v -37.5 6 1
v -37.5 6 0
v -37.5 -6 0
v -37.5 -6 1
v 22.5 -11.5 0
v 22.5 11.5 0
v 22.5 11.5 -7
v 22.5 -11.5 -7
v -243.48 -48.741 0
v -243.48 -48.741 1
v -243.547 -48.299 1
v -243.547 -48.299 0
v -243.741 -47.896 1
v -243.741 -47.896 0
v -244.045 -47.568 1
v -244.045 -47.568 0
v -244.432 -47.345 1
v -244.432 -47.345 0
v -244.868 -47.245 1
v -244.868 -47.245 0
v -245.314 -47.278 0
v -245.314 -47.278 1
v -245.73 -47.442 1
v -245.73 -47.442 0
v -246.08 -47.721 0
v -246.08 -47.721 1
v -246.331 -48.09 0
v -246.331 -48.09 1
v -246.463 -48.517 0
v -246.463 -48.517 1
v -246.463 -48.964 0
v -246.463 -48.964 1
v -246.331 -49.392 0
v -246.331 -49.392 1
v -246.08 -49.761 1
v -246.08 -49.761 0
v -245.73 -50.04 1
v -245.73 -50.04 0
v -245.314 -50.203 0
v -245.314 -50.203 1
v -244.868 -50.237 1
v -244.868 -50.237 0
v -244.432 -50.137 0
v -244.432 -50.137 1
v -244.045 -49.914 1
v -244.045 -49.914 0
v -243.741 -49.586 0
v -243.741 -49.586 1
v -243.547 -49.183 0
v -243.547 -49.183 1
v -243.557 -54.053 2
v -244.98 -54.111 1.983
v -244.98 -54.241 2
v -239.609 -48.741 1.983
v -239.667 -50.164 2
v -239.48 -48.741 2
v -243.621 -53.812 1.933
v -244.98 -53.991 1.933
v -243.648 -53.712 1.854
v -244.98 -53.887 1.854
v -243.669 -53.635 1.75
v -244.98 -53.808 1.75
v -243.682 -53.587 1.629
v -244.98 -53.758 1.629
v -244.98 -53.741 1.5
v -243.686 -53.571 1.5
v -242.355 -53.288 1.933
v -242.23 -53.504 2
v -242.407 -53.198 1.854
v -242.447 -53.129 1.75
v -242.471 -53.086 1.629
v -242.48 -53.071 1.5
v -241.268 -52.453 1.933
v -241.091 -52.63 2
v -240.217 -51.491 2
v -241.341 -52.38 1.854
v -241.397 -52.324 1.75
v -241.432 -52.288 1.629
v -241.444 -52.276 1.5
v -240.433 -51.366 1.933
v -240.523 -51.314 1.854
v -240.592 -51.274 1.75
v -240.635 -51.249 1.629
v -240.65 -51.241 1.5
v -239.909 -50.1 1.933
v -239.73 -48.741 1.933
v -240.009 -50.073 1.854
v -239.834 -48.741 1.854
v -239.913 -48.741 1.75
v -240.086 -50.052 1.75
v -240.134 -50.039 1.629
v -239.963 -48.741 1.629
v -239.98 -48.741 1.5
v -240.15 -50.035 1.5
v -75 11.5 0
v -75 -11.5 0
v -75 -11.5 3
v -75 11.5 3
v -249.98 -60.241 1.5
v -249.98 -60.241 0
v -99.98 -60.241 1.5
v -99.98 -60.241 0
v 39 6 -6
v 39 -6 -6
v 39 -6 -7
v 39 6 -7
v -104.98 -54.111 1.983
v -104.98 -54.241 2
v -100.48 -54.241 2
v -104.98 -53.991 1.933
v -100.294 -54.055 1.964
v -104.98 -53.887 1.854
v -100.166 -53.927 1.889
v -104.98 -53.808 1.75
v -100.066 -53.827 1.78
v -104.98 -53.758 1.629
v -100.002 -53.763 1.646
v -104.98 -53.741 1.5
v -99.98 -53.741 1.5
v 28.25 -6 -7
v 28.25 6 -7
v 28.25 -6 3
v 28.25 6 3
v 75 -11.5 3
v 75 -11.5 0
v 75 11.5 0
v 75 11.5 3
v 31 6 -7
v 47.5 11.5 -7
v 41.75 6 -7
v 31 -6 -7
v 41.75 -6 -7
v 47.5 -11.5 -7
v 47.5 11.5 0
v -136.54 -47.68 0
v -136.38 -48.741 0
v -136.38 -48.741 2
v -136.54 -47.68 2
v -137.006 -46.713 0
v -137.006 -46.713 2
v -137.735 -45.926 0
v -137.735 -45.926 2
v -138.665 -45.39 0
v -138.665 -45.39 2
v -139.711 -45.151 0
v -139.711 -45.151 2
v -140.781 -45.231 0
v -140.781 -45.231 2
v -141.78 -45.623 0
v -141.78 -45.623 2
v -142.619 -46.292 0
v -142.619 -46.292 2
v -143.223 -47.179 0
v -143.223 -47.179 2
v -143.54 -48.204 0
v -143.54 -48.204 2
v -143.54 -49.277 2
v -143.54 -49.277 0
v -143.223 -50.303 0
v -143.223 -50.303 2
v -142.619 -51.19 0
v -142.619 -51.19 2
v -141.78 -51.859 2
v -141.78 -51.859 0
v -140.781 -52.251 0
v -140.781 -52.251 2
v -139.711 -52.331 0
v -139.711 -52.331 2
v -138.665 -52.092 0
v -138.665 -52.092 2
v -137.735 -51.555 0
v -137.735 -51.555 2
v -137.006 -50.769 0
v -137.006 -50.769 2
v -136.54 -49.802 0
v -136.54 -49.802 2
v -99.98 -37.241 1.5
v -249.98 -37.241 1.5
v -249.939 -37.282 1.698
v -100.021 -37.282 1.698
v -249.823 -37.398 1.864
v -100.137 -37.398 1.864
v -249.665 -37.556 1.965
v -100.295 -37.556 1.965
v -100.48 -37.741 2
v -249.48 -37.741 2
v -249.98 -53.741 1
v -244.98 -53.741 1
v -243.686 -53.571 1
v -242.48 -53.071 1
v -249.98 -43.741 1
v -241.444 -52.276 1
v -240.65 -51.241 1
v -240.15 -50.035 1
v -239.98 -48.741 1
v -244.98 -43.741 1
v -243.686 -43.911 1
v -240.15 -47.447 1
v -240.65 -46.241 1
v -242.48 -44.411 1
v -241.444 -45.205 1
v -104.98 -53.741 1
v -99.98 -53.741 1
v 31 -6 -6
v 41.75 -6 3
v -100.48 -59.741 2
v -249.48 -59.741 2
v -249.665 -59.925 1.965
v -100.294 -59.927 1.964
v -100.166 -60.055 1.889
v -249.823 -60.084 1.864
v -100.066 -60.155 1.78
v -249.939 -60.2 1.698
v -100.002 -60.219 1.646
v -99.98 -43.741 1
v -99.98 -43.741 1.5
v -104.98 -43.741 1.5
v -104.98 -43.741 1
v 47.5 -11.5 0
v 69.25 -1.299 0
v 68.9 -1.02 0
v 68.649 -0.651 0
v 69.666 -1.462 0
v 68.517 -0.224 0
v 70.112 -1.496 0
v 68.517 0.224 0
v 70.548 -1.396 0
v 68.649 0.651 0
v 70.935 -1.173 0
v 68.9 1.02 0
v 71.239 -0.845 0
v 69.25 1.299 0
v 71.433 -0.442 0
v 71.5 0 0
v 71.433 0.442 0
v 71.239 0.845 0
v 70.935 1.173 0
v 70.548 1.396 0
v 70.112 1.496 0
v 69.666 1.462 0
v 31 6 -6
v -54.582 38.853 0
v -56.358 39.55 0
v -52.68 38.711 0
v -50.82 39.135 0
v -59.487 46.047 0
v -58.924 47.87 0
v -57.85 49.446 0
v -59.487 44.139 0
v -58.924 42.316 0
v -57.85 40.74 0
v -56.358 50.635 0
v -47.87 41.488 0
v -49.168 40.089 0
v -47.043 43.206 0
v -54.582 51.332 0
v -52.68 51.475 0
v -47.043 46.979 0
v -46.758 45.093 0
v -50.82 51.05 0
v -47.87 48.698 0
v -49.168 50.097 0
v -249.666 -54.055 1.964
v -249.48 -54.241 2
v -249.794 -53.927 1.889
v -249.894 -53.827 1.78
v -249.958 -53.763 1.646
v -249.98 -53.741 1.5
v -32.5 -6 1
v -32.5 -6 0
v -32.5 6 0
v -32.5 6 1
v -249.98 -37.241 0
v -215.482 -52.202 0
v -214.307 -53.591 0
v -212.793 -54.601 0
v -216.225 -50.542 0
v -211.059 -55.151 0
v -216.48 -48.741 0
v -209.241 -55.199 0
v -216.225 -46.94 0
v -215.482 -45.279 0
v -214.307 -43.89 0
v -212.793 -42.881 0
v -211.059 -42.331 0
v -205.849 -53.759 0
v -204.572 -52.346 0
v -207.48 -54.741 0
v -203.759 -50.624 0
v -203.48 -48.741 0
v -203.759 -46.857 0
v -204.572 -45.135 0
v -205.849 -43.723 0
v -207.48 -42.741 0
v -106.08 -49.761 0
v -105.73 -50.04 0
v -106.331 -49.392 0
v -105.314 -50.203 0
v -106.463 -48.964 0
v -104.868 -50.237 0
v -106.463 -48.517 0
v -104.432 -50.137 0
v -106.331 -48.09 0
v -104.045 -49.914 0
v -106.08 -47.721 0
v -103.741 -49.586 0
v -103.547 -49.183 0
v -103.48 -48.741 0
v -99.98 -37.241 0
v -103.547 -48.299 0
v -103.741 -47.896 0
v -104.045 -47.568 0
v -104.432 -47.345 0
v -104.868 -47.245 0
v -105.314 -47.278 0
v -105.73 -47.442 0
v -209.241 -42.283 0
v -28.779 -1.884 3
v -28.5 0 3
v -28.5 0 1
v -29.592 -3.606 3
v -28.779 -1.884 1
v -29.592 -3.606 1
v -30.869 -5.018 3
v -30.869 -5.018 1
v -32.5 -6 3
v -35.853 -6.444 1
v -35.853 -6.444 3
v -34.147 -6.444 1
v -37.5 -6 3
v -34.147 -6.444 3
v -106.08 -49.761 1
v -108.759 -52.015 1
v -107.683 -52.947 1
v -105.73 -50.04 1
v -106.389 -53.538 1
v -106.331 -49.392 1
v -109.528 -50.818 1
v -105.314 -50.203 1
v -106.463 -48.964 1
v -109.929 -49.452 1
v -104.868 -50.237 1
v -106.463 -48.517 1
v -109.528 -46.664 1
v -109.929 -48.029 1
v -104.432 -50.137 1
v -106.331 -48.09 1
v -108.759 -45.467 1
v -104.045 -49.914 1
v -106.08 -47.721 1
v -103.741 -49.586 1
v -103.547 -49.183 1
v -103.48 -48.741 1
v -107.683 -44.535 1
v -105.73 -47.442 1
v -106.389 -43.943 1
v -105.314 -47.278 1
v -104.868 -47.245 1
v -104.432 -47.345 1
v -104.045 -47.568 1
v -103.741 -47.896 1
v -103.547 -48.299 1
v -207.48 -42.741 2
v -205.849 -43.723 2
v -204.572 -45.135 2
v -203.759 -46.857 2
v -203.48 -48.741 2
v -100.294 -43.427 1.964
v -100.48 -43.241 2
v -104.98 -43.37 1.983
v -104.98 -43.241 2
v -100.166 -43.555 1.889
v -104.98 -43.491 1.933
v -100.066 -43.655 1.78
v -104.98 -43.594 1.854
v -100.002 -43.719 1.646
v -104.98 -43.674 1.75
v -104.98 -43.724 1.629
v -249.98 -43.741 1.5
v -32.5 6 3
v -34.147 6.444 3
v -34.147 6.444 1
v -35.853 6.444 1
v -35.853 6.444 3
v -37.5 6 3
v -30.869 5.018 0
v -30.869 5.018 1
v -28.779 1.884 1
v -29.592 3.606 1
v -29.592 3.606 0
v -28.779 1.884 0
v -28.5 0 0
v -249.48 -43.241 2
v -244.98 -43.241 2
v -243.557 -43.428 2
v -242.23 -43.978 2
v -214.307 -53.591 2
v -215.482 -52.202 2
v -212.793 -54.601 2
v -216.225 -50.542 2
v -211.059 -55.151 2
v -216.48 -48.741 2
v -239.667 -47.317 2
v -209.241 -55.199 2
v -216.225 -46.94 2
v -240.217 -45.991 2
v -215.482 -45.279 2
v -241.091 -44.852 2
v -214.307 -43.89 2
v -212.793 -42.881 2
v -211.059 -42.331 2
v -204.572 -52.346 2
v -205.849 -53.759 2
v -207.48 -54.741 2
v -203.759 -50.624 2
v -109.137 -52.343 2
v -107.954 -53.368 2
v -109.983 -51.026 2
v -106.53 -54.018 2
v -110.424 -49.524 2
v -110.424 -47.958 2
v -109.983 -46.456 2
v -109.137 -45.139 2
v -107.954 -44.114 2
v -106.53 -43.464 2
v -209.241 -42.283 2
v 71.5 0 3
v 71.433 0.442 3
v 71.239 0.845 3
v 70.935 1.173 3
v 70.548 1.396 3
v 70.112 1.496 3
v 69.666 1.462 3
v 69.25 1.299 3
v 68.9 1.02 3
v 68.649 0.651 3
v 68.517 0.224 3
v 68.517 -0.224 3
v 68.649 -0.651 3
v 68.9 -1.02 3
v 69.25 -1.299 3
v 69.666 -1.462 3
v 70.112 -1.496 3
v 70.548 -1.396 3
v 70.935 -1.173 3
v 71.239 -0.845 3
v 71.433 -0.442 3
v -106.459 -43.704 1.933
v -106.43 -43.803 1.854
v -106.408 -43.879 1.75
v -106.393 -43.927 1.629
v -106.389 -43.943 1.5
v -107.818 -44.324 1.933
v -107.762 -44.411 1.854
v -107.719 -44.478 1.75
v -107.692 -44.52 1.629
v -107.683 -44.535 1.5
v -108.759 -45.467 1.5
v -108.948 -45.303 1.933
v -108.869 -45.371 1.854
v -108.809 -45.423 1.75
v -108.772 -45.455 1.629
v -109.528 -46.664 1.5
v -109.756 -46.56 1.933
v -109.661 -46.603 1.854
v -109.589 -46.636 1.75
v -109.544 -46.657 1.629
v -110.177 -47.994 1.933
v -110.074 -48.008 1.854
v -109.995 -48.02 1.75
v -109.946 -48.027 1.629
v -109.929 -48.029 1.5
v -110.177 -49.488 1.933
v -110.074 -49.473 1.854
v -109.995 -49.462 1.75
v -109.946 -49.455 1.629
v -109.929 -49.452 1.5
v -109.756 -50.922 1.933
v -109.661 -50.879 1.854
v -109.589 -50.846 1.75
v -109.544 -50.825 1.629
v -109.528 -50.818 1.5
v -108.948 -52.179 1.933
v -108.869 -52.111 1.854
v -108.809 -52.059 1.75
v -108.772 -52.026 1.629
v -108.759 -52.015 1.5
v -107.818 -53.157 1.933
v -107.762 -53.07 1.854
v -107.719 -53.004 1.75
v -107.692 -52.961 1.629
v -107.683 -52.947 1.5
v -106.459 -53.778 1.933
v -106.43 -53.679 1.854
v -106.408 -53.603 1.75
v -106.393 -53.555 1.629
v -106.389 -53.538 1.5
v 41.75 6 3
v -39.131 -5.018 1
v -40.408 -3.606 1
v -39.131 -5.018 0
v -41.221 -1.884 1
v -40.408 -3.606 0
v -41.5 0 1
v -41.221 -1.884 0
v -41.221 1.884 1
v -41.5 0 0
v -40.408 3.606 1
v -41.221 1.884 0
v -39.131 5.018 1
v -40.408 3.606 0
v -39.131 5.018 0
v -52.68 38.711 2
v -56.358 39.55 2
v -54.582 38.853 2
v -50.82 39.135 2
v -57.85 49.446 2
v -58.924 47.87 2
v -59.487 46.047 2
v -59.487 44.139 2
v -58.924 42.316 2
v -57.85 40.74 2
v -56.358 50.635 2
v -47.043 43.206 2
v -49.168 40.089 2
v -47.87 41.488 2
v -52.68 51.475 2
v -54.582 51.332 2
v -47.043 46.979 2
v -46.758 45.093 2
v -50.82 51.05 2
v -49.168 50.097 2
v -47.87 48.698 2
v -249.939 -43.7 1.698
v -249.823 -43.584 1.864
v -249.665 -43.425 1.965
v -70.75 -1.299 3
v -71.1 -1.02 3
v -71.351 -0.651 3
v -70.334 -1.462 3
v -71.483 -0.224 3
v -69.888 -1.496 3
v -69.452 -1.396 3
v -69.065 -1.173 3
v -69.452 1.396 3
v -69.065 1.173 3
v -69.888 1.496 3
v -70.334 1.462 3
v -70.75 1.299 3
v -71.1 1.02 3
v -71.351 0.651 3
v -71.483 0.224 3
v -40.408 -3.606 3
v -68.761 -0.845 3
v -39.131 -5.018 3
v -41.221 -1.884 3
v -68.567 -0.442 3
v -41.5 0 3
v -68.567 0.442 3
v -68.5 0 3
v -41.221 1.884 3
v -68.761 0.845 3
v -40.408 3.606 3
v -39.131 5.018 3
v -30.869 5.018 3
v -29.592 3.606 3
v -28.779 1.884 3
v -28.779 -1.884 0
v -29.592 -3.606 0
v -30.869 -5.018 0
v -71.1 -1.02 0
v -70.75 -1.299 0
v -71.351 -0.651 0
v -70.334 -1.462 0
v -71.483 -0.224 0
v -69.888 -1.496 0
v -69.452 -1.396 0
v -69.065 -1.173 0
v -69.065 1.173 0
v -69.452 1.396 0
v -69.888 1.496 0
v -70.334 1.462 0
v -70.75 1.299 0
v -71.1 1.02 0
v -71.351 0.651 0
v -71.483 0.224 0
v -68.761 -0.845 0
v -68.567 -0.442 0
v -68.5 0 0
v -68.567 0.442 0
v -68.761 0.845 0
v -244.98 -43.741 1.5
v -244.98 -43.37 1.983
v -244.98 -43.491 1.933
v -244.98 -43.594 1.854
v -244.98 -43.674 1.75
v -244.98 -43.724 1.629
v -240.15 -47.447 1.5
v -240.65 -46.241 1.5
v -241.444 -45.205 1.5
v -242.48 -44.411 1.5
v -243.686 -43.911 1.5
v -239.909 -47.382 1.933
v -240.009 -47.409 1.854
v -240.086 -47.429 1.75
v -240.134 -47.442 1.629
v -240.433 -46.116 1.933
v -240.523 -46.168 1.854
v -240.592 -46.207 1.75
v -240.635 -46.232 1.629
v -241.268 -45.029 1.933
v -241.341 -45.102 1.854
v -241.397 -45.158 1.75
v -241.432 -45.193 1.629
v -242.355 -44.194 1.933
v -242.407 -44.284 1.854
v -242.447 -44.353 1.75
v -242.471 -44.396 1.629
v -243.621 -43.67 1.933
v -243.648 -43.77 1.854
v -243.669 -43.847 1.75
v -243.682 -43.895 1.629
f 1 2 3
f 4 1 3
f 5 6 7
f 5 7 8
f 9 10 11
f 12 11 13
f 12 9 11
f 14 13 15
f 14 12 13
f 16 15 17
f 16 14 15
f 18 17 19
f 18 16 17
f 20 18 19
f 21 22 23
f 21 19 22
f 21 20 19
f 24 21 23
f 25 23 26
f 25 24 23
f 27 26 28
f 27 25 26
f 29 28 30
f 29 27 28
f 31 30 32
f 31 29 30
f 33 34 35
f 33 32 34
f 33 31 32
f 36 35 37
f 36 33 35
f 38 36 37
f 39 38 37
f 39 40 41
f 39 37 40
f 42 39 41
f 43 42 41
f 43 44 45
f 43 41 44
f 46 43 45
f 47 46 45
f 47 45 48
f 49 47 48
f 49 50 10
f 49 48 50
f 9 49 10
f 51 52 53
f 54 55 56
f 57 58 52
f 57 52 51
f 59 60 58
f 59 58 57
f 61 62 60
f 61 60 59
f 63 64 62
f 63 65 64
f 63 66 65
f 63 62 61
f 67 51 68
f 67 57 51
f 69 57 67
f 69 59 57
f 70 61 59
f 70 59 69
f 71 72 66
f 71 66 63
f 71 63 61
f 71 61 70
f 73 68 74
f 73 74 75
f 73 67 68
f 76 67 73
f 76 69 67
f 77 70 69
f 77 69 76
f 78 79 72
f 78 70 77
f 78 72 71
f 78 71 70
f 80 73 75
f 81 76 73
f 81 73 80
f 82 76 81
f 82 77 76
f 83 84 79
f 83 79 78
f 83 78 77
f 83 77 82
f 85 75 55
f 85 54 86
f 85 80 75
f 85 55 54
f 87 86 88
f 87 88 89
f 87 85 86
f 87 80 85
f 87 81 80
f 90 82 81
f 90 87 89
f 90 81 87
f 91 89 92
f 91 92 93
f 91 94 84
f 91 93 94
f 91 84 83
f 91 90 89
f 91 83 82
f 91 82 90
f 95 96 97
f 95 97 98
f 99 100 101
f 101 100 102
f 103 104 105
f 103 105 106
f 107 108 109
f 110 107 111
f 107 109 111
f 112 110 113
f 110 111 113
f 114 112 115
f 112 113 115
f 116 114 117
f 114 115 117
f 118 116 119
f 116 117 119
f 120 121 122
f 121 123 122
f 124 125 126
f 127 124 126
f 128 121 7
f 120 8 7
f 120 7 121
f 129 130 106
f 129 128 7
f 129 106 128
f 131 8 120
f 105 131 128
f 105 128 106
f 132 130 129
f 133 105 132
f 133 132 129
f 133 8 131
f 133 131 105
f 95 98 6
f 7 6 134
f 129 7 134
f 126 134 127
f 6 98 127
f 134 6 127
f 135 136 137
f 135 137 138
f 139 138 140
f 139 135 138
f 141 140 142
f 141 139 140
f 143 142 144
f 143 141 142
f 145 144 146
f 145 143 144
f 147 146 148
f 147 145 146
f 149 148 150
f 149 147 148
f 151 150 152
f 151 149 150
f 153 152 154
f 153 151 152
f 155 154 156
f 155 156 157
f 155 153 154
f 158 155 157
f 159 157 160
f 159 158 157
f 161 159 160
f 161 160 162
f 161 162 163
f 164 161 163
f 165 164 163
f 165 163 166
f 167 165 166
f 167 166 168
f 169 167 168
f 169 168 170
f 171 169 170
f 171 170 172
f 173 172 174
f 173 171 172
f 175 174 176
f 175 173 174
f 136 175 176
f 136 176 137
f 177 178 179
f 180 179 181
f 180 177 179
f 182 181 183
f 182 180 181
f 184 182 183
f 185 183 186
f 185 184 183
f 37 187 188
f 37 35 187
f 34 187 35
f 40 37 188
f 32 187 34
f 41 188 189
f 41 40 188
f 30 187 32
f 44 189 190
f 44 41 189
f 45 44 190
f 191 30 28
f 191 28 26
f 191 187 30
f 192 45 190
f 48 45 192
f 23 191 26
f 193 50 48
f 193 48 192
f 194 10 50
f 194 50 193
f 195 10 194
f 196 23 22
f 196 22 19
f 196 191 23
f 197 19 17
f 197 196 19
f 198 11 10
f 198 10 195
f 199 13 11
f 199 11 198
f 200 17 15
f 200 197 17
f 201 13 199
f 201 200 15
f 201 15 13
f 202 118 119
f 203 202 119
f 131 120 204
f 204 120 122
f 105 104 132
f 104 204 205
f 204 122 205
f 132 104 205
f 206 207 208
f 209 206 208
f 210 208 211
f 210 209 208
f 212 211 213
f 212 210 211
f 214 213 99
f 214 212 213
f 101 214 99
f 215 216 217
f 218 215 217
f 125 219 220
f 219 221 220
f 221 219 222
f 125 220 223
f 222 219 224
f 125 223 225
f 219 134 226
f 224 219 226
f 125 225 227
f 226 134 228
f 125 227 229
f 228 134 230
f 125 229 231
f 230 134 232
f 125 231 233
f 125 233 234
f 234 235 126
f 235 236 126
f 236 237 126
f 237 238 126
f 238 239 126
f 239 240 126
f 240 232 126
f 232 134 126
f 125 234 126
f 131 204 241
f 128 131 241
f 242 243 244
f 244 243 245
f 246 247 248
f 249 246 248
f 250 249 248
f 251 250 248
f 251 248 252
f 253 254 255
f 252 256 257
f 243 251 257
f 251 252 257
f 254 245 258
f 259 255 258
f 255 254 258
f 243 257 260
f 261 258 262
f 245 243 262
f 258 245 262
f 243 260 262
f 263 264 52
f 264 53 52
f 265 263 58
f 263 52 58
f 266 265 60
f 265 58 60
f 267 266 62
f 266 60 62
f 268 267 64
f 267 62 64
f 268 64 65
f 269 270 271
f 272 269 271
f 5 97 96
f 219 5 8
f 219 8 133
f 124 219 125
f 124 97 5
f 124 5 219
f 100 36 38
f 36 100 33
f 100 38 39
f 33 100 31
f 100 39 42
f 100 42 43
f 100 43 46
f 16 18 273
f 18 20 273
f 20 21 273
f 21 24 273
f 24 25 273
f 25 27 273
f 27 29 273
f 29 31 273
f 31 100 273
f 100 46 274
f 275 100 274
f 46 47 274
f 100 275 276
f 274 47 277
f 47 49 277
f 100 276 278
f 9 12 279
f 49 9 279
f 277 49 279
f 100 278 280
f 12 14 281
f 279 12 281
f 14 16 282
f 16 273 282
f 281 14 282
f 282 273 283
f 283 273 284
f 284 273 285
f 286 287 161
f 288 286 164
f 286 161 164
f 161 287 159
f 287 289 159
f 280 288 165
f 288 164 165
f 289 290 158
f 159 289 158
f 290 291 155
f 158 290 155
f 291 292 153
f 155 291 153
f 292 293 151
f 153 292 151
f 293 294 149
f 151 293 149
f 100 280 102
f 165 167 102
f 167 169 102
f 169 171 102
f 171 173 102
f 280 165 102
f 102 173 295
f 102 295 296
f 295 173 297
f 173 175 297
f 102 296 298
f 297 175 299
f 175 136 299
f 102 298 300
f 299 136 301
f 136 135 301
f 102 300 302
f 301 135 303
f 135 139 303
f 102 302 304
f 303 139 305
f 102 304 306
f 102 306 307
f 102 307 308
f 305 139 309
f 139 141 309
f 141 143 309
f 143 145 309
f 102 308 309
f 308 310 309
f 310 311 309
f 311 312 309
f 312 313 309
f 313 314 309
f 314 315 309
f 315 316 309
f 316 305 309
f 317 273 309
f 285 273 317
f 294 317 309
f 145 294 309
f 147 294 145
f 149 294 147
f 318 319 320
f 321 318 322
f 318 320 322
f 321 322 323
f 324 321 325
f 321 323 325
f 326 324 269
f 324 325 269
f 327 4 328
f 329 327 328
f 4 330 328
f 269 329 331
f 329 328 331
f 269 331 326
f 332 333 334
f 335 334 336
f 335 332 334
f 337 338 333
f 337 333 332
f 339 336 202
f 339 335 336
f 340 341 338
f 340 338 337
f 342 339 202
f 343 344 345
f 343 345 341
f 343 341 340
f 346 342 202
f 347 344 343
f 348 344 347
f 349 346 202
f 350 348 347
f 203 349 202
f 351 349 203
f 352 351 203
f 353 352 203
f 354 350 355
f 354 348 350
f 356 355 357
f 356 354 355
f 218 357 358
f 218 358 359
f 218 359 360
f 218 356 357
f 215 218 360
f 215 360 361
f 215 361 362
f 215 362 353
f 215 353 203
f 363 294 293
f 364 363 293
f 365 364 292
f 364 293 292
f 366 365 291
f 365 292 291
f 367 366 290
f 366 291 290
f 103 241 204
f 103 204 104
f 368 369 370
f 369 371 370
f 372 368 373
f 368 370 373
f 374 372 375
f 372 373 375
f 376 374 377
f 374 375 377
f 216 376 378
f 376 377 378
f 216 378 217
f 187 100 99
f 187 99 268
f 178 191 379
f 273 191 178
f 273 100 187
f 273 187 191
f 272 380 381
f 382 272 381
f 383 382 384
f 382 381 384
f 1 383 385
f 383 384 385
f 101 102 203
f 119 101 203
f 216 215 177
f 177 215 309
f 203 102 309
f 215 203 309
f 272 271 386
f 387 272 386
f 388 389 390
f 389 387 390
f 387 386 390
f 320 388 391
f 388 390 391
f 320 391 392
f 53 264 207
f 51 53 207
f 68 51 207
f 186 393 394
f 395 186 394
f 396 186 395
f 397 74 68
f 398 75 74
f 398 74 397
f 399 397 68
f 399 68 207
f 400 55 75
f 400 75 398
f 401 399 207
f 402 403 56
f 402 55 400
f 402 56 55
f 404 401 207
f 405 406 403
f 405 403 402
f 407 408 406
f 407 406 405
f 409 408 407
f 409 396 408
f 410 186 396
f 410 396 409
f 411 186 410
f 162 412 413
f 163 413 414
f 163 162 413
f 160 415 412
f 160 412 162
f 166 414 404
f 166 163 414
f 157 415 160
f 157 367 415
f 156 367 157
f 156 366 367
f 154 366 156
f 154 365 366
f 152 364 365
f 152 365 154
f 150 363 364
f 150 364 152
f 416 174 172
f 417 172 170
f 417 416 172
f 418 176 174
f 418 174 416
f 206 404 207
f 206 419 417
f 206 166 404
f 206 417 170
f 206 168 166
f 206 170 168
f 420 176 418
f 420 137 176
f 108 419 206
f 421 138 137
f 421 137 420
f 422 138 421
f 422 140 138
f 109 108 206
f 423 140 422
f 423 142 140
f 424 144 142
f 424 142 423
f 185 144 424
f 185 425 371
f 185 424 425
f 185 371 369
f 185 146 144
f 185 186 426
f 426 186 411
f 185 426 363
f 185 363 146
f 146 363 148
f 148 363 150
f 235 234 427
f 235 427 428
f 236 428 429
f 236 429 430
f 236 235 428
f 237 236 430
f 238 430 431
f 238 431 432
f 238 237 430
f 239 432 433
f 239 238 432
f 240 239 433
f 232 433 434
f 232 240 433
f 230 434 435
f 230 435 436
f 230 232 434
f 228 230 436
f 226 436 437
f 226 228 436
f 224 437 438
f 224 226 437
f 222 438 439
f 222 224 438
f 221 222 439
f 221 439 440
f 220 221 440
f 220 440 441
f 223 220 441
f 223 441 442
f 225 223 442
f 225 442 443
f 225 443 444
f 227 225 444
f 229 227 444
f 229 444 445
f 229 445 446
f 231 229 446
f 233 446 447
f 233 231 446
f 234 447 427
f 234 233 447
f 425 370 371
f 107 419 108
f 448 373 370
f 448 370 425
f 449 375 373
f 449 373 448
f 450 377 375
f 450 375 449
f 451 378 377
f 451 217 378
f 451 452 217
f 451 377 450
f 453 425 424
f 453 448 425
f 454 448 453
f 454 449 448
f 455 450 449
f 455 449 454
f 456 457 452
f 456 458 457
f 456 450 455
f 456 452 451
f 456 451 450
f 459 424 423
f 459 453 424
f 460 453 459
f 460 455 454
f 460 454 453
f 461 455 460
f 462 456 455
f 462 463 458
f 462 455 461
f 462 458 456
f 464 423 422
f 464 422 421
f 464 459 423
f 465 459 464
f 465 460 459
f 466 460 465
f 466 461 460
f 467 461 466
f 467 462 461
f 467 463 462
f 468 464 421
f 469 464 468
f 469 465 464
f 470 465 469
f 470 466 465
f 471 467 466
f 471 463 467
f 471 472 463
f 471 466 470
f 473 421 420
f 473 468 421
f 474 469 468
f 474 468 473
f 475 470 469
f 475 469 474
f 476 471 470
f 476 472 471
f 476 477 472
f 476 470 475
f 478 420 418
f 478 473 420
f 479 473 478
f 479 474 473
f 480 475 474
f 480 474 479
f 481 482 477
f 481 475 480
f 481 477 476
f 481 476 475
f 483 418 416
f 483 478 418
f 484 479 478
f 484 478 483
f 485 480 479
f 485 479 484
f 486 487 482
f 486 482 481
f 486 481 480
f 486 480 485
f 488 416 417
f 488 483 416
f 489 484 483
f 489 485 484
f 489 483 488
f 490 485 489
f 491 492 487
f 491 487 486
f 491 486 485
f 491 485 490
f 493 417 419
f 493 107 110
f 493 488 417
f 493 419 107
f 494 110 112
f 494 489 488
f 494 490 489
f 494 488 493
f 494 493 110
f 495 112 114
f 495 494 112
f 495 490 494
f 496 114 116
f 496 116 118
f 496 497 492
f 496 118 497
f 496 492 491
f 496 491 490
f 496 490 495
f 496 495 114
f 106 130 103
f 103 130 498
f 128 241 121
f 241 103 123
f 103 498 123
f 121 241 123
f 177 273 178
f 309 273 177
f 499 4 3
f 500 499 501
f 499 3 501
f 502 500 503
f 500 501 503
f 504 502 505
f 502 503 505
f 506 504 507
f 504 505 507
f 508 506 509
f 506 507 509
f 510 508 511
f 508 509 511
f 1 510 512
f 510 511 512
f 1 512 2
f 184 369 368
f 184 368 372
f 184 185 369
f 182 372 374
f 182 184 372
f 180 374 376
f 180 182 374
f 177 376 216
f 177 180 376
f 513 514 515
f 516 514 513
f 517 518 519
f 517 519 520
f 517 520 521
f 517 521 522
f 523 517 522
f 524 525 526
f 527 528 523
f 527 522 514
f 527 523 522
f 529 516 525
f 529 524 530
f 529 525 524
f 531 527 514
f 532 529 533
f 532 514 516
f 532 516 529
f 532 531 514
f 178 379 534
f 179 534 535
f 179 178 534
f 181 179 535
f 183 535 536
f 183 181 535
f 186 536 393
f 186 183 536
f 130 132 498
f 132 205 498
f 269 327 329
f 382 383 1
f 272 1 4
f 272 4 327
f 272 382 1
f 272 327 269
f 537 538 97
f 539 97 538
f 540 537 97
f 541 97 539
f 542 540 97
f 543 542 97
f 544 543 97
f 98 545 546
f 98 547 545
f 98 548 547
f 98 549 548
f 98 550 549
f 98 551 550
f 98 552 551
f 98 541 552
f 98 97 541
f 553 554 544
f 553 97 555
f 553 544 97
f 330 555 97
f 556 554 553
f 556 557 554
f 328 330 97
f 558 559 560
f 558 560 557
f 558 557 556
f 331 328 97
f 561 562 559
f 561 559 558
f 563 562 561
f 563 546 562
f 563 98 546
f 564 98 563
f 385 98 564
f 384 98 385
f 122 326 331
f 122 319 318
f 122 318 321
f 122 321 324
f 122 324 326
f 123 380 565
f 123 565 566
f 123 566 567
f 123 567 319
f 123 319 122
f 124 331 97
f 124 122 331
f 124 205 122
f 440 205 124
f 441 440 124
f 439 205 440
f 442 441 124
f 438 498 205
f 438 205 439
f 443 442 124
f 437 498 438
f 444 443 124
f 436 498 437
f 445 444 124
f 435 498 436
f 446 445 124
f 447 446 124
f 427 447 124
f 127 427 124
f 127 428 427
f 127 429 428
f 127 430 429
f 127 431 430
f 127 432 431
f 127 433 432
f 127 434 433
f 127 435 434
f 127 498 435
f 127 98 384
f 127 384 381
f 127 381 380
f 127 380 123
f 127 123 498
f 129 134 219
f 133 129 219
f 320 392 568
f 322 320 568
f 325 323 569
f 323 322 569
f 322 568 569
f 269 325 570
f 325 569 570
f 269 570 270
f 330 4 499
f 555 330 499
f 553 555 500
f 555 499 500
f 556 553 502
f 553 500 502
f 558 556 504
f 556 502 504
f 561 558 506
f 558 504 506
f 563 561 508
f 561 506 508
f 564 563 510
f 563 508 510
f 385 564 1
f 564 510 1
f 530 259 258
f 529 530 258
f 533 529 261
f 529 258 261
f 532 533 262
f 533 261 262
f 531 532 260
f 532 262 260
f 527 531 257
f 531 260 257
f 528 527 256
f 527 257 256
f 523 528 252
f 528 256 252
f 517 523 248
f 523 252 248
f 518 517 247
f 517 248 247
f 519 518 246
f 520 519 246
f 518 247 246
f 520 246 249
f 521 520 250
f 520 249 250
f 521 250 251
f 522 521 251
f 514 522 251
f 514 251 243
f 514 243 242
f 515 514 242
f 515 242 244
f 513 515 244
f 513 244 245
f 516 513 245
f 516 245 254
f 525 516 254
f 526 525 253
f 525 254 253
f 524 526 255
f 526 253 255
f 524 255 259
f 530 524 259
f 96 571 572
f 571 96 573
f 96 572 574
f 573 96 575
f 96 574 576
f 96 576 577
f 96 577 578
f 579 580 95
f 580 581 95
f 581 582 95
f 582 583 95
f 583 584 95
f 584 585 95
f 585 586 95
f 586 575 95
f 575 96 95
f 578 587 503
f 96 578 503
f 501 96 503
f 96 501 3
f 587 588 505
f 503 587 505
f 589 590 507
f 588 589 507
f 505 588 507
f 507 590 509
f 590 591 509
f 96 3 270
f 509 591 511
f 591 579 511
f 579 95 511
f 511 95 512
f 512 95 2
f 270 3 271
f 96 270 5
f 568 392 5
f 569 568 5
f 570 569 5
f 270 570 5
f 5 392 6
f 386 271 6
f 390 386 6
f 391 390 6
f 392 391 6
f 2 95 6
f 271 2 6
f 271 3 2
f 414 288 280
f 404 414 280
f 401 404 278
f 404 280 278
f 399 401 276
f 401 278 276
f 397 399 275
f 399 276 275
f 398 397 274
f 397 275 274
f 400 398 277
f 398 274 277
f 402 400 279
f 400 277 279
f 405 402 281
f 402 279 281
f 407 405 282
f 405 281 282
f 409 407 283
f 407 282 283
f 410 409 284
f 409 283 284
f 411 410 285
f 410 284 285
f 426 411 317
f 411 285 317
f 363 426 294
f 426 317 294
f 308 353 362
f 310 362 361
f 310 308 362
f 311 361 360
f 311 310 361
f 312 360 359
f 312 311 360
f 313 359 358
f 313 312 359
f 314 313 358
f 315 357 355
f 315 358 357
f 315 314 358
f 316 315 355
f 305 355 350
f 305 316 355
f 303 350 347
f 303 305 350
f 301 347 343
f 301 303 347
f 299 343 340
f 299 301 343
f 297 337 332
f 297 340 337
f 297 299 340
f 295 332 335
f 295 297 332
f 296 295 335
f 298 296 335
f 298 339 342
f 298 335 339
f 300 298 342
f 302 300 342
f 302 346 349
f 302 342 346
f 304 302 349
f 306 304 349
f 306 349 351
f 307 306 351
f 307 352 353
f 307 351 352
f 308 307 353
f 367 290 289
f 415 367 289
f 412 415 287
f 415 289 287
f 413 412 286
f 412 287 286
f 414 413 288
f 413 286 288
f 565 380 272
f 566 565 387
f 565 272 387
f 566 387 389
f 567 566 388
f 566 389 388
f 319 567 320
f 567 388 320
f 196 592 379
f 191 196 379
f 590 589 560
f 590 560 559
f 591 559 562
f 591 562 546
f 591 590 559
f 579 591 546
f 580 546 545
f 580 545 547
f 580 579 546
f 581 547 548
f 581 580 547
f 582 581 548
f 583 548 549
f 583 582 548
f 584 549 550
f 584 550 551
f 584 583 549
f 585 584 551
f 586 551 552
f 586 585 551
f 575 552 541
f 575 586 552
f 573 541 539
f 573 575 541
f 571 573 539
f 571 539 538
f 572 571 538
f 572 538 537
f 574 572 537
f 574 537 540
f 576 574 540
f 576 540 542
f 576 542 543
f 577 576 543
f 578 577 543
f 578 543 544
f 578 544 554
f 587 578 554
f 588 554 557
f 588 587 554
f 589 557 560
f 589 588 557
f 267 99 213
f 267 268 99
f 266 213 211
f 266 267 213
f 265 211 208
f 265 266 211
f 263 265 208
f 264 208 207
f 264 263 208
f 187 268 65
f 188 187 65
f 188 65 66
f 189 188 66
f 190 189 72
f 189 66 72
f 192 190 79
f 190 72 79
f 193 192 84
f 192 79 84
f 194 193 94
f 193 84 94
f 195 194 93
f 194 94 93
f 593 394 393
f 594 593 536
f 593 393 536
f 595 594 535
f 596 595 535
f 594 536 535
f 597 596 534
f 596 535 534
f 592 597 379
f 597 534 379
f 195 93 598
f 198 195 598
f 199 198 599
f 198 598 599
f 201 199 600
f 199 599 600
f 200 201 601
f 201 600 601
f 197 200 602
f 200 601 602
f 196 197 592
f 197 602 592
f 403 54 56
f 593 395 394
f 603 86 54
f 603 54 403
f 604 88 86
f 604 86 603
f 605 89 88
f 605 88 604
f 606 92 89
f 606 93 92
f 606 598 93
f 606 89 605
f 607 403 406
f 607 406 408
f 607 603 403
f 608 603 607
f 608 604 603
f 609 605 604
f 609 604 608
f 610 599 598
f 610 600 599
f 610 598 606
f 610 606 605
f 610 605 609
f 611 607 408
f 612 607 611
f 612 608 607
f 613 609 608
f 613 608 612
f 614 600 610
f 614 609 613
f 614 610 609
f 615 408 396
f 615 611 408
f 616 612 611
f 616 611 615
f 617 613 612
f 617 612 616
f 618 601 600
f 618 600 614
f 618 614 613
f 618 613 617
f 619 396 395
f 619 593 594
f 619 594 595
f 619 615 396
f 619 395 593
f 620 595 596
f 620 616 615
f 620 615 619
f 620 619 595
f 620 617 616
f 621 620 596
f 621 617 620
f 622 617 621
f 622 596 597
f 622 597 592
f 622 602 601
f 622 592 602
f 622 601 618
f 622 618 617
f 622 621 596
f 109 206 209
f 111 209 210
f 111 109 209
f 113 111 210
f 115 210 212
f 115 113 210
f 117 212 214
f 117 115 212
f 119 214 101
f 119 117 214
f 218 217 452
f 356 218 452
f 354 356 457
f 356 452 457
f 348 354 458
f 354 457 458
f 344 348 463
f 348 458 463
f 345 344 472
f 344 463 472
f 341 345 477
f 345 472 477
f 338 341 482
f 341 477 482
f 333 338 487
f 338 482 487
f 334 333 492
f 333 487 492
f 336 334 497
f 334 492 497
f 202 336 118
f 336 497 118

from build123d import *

# Parameters (mm, degrees)
F0_W      = 150
F0_H      = 23
F0_R      = 1.5
F0_W_2    = 8
F0_H_2    = 12
F1_DEPTH  = 3
F2_W      = 150
F2_H      = 23
F2_R      = 1.5
F2_R_2    = 3.6
F3_DEPTH  = 2
F4_W      = 25
F4_H      = 23
F5_DEPTH  = 7
F6_W      = 13.5
F6_H      = 12
F7_DEPTH  = 9
F8_R      = 6.5
F9_DEPTH  = 2
F10_R     = 6.4
F11_DEPTH = 2
F13_DEPTH = 1
F14_R     = 0.5


with BuildPart() as f1:
    # F0 (on Top) → F1 (new body)
    with BuildSketch(Plane.XY):
        Rectangle(F0_W, F0_H)
        with Locations((-70, 0)):
            Circle(F0_R, mode=Mode.SUBTRACT)
        with BuildLine():
            ThreePointArc((-32.5, 6), (-29.5916730868, 3.6055512755), (-28.5, 0))
            ThreePointArc((-28.5, 0), (-29.5916730868, -3.6055512755), (-32.5, -6))
            ThreePointArc((-32.5, -6), (-35, -6.5), (-37.5, -6))
            ThreePointArc((-37.5, -6), (-41.5, 0), (-37.5, 6))
            ThreePointArc((-37.5, 6), (-35, 6.5), (-32.5, 6))
        make_face(mode=Mode.SUBTRACT)
        Polygon((41.75, 6), (41.75, -6), (39, -6), (31, -6), (28.25, -6), (28.25, 6), (31, 6), (39, 6), align=None, mode=Mode.SUBTRACT)
        with Locations((70, 0)):
            Circle(F0_R, mode=Mode.SUBTRACT)
        with Locations((35, 0)):
            Rectangle(F0_W_2, F0_H_2)
        with BuildLine():
            Line((-32.5, -6), (-32.5, 6))
            ThreePointArc((-32.5, 6), (-35, 6.5), (-37.5, 6))
            Line((-37.5, 6), (-37.5, -6))
            ThreePointArc((-37.5, -6), (-35, -6.5), (-32.5, -6))
        make_face()
    extrude(amount=F1_DEPTH)

    # F4 (on face) + F0 (on Top) → F5 (join)
    with BuildSketch(Plane(origin=(0, 0, 0), x_dir=(1, 0, 0), z_dir=(0, 0, -1))):
        with Locations((35, 0)):
            Rectangle(F4_W, F4_H)
        Polygon((41.75, 6), (41.75, -6), (39, -6), (31, -6), (28.25, -6), (28.25, 6), (31, 6), (39, 6), align=None, mode=Mode.SUBTRACT)
    with BuildSketch(Plane.XY):
        with Locations((35, 0)):
            Rectangle(F0_W_2, F0_H_2)
    extrude(amount=F5_DEPTH, dir=(0, 0, -1))

    # F6 (on face) → F7 (cut)
    with BuildSketch(Plane.XY.offset(3)):
        with Locations((35, 0)):
            Rectangle(F6_W, F6_H)
    extrude(amount=-F7_DEPTH, mode=Mode.SUBTRACT)

    # F8 (on face) → F9 (cut)
    with BuildSketch(Plane.XY.offset(3)):
        with Locations((-35, 0)):
            Circle(F8_R)
    extrude(amount=-F9_DEPTH, mode=Mode.SUBTRACT)


with BuildPart() as f3:
    # F2 (on Top) → F3 (new body)
    with BuildSketch(Plane.XY):
        with Locations((-174.9800115824, -48.7408889234)):
            Rectangle(F2_W, F2_H)
        with Locations((-244.9800115824, -48.7408889234)):
            Circle(F2_R, mode=Mode.SUBTRACT)
        with BuildLine():
            ThreePointArc((-207.4800115824, -42.7408889234), (-204.5716846692, -45.1353376479), (-203.4800115824, -48.7408889234))
            ThreePointArc((-203.4800115824, -48.7408889234), (-204.5716846692, -52.3464401989), (-207.4800115824, -54.7408889234))
            ThreePointArc((-207.4800115824, -54.7408889234), (-209.9800115824, -55.2408889234), (-212.4800115824, -54.7408889234))
            ThreePointArc((-212.4800115824, -54.7408889234), (-216.4800115824, -48.7408889234), (-212.4800115824, -42.7408889234))
            ThreePointArc((-212.4800115824, -42.7408889234), (-209.9800115824, -42.2408889234), (-207.4800115824, -42.7408889234))
        make_face(mode=Mode.SUBTRACT)
        with Locations((-139.9800115824, -48.7408889234)):
            Circle(F2_R_2, mode=Mode.SUBTRACT)
        with Locations((-104.9800115824, -48.7408889234)):
            Circle(F2_R, mode=Mode.SUBTRACT)
    extrude(amount=F3_DEPTH)

    # F12 (on face) → F13 (cut)
    with BuildSketch(Plane.XY.offset(2)):
        with BuildLine():
            ThreePointArc((-244.9800115824, -53.7408889234), (-241.4444776764, -52.2764228293), (-239.9800115824, -48.7408889234))
            ThreePointArc((-239.9800115824, -48.7408889234), (-241.4444776764, -45.2053550175), (-244.9800115824, -43.7408889234))
            ThreePointArc((-244.9800115824, -43.7408889234), (-249.9800115824, -48.7408889234), (-244.9800115824, -53.7408889234))
        make_face()
        with BuildLine():
            ThreePointArc((-244.9800115824, -53.7408889234), (-249.9800115824, -48.7408889234), (-244.9800115824, -43.7408889234))
            Line((-244.9800115824, -43.7408889234), (-252.4800115824, -43.7408889234))
            Line((-252.4800115824, -43.7408889234), (-252.4800115824, -53.7408889234))
            Line((-252.4800115824, -53.7408889234), (-244.9800115824, -53.7408889234))
        make_face()
        with BuildLine():
            ThreePointArc((-104.9800115824, -53.7408889234), (-101.4444776764, -52.2764228293), (-99.9800115824, -48.7408889234))
            ThreePointArc((-99.9800115824, -48.7408889234), (-101.4444776764, -45.2053550175), (-104.9800115824, -43.7408889234))
            ThreePointArc((-104.9800115824, -43.7408889234), (-109.9800115824, -48.7408889234), (-104.9800115824, -53.7408889234))
        make_face()
        with BuildLine():
            ThreePointArc((-104.9800115824, -43.7408889234), (-101.4444776764, -45.2053550175), (-99.9800115824, -48.7408889234))
            ThreePointArc((-99.9800115824, -48.7408889234), (-101.4444776764, -52.2764228293), (-104.9800115824, -53.7408889234))
            Line((-104.9800115824, -53.7408889234), (-97.4800115824, -53.7408889234))
            Line((-97.4800115824, -53.7408889234), (-97.4800115824, -43.7408889234))
            Line((-97.4800115824, -43.7408889234), (-104.9800115824, -43.7408889234))
        make_face()
    extrude(amount=-F13_DEPTH, mode=Mode.SUBTRACT)

    # F14
    f14_edges = [f3.edges().sort_by_distance(p)[0] for p in [
        (-174.980012, -37.240889, 2),
        (-249.980012, -40.490889, 2),
        (-247.480012, -43.740889, 2),
        (-249.980012, -56.990889, 2),
        (-174.980012, -60.240889, 2),
        (-99.980012, -56.990889, 2),
        (-102.480012, -53.740889, 2),
        (-99.980012, -40.490889, 2),
    ]]
    fillet(f14_edges, radius=F14_R)


with BuildPart() as f11:
    # F10 (on Top) → F11 (new body)
    with BuildSketch(Plane.XY):
        with Locations((-53.158197552, 45.0928770006)):
            Circle(F10_R)
    extrude(amount=F11_DEPTH)


solid = Compound([f1.part, f3.part, f11.part])
